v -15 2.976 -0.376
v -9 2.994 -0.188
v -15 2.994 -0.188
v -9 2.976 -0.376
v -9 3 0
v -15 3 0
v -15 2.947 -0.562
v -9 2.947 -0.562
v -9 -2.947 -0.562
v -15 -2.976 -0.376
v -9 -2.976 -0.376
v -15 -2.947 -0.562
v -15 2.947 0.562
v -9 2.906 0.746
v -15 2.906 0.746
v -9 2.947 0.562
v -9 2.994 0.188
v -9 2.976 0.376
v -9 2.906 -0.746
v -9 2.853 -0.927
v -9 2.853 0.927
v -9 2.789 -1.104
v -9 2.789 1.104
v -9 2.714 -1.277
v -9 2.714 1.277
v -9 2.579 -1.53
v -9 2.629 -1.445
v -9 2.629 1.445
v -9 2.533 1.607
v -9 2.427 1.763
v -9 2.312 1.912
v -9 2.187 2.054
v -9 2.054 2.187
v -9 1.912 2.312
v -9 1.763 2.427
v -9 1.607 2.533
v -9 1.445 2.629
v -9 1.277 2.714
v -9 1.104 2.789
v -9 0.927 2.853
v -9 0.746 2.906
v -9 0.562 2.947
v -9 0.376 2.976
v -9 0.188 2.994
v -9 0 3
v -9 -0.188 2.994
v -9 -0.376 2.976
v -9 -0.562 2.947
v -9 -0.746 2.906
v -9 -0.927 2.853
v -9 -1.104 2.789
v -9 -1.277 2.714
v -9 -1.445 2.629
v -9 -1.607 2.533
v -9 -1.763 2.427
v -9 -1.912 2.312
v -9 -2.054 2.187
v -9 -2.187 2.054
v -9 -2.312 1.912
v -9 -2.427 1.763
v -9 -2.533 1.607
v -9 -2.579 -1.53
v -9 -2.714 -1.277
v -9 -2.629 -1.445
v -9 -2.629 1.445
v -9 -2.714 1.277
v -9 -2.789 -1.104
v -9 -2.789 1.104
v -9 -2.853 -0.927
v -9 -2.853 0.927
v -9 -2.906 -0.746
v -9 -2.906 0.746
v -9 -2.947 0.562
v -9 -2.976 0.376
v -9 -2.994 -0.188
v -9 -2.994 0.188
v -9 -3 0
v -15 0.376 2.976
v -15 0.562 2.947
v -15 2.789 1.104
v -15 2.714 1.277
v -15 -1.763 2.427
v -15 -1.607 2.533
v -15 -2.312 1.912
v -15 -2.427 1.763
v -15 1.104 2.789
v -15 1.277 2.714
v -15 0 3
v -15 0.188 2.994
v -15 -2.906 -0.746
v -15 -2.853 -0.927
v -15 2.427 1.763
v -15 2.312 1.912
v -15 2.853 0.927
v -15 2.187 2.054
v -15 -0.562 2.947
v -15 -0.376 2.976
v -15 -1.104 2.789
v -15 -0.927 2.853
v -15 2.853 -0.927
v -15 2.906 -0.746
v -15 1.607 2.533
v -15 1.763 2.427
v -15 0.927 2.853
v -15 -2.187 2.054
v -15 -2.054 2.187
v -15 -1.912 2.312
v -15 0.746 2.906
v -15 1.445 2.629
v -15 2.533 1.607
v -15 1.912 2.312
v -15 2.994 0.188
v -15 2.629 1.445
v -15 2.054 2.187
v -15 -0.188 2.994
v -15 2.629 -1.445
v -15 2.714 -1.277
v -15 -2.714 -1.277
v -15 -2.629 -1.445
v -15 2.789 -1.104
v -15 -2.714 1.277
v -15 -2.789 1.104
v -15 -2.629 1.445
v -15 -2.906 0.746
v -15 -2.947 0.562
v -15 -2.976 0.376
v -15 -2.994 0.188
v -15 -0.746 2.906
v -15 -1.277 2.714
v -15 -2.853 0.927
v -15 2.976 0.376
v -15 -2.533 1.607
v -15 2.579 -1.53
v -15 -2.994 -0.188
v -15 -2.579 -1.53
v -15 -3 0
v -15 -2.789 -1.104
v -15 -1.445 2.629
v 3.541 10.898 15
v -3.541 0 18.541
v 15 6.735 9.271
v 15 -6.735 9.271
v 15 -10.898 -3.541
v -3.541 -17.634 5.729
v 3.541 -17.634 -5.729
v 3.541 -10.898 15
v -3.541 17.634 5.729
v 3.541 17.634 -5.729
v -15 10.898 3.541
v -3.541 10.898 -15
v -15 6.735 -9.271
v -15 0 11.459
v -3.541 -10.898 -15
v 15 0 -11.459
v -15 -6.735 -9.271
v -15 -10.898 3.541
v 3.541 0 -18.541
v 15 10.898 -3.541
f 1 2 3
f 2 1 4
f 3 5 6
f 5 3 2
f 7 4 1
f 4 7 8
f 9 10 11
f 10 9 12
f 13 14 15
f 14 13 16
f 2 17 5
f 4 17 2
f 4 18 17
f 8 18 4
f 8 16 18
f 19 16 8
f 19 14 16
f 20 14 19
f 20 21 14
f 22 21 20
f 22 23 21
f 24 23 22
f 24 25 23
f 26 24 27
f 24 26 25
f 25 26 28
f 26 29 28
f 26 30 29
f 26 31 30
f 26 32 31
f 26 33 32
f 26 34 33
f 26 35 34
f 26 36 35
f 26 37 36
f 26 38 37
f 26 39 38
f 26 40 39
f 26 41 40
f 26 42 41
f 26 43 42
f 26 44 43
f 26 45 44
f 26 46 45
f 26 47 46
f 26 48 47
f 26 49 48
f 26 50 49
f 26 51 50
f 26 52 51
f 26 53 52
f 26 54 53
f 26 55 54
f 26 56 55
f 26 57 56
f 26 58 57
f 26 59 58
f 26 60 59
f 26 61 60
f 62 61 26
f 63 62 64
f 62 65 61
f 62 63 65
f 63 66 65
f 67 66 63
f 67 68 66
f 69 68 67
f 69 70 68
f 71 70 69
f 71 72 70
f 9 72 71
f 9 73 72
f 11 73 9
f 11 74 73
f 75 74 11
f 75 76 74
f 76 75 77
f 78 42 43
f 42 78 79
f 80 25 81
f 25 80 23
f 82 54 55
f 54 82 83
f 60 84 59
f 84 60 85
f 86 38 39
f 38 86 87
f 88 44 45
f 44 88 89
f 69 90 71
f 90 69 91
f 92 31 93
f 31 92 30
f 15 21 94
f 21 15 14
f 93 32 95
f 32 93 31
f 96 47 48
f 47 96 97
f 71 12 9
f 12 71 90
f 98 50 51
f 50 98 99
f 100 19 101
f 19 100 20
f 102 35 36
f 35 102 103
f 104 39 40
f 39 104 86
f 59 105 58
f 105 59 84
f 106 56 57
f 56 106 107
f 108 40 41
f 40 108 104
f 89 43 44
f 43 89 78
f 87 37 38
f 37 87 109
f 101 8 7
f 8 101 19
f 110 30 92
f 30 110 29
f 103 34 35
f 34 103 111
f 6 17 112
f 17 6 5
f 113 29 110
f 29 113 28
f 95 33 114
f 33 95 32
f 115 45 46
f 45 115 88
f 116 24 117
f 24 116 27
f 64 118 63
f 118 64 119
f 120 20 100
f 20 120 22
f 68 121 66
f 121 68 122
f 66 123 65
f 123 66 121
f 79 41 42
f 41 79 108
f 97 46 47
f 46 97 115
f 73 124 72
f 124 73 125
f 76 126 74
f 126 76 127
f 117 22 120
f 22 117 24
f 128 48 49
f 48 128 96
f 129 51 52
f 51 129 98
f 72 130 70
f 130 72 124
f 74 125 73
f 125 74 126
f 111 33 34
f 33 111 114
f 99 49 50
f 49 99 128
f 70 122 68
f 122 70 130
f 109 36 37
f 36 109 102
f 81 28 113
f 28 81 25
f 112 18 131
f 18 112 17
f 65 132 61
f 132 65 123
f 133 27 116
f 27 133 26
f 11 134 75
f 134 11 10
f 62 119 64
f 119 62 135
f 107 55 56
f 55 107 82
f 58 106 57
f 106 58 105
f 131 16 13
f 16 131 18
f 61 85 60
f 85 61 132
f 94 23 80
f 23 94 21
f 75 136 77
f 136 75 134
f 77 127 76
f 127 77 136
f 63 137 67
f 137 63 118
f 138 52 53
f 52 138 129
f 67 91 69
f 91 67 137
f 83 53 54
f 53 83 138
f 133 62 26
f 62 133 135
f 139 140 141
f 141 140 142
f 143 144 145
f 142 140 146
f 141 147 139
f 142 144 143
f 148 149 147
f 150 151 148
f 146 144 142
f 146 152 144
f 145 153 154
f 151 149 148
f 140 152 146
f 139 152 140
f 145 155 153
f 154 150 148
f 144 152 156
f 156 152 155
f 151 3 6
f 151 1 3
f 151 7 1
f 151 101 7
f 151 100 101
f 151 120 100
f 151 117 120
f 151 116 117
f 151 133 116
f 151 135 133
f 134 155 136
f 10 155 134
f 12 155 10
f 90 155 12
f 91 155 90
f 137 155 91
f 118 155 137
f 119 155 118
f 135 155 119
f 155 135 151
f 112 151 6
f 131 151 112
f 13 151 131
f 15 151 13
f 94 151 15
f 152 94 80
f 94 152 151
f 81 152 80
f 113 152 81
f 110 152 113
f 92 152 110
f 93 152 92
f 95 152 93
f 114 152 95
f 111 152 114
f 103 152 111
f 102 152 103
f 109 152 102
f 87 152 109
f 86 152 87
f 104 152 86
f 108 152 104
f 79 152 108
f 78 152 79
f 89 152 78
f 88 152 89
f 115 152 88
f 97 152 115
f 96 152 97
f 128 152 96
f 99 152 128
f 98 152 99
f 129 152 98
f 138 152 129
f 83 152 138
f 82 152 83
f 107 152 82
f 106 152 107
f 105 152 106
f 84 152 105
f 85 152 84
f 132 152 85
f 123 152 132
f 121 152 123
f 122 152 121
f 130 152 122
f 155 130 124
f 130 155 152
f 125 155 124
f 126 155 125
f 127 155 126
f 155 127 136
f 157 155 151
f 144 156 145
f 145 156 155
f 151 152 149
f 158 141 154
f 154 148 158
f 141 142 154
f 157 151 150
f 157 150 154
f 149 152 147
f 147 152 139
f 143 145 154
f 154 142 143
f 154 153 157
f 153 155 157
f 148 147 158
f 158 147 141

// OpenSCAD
$fn = 100;
diameter = 6;
radius = diameter / 2;
outer_to_flat = 4.53;
depth = 6;
knob_height = 20;
knob_width = 20;

module shaft() {
  difference() {
    translate([radius, radius, 0]) {
      cylinder(depth, r = radius);
    }

    translate([0, outer_to_flat, 0 - 0.1]) {
      cube([depth, depth, depth + 0.2]);
    }
  }
}

module centered_shaft() {
  #translate([depth, - radius, radius]) {
    rotate(90, [0, 0, 1]) {
      rotate(270, [1, 0, 0]) {
        shaft();
      }
    }
  }
}

module dodecahedron(size) {
    phi = (1 + sqrt(5)) / 2;

    points = [
      [1, 1, 1],
      [1, 1, -1],
      [1, -1, 1],
      [1, -1, -1],
      [-1, 1, 1],
      [-1, 1, -1],
      [-1, -1, 1],
      [-1, -1, -1],
      [0, 1 / phi, phi],
      [0, 1 / phi, -phi],
      [0, -1 / phi, phi],
      [0, -1 / phi, -phi],
      [1 / phi, phi, 0],
      [1 / phi, -phi, 0],
      [-1 / phi, phi, 0],
      [-1 / phi, -phi, 0],
      [phi, 0, 1 / phi],
      [phi, 0, -1 / phi],
      [-phi, 0, 1 / phi],
      [-phi, 0, -1 / phi]
    ];


    // for (i = [0 : len(points) - 1]) {
    //   p = points[i];
    //   translate(p * 50) {
    //     color("#0000ff") {
    //       text(str(i), size = 10);
    //     }
    //   }
    // }

    faces = [
        [8, 10, 6, 18, 4],
        [0, 16, 2, 10, 8],
        [2, 16, 17, 3, 13],
        [10, 2, 13, 15, 6],
        [15, 13, 3, 11, 7],
        [18, 6, 15, 7, 19],
        [4, 18, 19, 5, 14],
        [0, 8, 4, 14, 12],
        [0, 12, 1, 17, 16],
        [14, 5, 9, 1, 12],
        [5, 19, 7, 11, 9],
        [1, 9, 11, 3, 17],
    ];

    resize([size, 0, 0], auto = true) {
      rotate(116.565 / 2, [0, 1, 0]) {
        polyhedron(points = points, faces = faces);
      }
    }
}

difference() {
  dodecahedron(30);
  translate([-15, 0, 0]) {
    centered_shaft();
  }
}
